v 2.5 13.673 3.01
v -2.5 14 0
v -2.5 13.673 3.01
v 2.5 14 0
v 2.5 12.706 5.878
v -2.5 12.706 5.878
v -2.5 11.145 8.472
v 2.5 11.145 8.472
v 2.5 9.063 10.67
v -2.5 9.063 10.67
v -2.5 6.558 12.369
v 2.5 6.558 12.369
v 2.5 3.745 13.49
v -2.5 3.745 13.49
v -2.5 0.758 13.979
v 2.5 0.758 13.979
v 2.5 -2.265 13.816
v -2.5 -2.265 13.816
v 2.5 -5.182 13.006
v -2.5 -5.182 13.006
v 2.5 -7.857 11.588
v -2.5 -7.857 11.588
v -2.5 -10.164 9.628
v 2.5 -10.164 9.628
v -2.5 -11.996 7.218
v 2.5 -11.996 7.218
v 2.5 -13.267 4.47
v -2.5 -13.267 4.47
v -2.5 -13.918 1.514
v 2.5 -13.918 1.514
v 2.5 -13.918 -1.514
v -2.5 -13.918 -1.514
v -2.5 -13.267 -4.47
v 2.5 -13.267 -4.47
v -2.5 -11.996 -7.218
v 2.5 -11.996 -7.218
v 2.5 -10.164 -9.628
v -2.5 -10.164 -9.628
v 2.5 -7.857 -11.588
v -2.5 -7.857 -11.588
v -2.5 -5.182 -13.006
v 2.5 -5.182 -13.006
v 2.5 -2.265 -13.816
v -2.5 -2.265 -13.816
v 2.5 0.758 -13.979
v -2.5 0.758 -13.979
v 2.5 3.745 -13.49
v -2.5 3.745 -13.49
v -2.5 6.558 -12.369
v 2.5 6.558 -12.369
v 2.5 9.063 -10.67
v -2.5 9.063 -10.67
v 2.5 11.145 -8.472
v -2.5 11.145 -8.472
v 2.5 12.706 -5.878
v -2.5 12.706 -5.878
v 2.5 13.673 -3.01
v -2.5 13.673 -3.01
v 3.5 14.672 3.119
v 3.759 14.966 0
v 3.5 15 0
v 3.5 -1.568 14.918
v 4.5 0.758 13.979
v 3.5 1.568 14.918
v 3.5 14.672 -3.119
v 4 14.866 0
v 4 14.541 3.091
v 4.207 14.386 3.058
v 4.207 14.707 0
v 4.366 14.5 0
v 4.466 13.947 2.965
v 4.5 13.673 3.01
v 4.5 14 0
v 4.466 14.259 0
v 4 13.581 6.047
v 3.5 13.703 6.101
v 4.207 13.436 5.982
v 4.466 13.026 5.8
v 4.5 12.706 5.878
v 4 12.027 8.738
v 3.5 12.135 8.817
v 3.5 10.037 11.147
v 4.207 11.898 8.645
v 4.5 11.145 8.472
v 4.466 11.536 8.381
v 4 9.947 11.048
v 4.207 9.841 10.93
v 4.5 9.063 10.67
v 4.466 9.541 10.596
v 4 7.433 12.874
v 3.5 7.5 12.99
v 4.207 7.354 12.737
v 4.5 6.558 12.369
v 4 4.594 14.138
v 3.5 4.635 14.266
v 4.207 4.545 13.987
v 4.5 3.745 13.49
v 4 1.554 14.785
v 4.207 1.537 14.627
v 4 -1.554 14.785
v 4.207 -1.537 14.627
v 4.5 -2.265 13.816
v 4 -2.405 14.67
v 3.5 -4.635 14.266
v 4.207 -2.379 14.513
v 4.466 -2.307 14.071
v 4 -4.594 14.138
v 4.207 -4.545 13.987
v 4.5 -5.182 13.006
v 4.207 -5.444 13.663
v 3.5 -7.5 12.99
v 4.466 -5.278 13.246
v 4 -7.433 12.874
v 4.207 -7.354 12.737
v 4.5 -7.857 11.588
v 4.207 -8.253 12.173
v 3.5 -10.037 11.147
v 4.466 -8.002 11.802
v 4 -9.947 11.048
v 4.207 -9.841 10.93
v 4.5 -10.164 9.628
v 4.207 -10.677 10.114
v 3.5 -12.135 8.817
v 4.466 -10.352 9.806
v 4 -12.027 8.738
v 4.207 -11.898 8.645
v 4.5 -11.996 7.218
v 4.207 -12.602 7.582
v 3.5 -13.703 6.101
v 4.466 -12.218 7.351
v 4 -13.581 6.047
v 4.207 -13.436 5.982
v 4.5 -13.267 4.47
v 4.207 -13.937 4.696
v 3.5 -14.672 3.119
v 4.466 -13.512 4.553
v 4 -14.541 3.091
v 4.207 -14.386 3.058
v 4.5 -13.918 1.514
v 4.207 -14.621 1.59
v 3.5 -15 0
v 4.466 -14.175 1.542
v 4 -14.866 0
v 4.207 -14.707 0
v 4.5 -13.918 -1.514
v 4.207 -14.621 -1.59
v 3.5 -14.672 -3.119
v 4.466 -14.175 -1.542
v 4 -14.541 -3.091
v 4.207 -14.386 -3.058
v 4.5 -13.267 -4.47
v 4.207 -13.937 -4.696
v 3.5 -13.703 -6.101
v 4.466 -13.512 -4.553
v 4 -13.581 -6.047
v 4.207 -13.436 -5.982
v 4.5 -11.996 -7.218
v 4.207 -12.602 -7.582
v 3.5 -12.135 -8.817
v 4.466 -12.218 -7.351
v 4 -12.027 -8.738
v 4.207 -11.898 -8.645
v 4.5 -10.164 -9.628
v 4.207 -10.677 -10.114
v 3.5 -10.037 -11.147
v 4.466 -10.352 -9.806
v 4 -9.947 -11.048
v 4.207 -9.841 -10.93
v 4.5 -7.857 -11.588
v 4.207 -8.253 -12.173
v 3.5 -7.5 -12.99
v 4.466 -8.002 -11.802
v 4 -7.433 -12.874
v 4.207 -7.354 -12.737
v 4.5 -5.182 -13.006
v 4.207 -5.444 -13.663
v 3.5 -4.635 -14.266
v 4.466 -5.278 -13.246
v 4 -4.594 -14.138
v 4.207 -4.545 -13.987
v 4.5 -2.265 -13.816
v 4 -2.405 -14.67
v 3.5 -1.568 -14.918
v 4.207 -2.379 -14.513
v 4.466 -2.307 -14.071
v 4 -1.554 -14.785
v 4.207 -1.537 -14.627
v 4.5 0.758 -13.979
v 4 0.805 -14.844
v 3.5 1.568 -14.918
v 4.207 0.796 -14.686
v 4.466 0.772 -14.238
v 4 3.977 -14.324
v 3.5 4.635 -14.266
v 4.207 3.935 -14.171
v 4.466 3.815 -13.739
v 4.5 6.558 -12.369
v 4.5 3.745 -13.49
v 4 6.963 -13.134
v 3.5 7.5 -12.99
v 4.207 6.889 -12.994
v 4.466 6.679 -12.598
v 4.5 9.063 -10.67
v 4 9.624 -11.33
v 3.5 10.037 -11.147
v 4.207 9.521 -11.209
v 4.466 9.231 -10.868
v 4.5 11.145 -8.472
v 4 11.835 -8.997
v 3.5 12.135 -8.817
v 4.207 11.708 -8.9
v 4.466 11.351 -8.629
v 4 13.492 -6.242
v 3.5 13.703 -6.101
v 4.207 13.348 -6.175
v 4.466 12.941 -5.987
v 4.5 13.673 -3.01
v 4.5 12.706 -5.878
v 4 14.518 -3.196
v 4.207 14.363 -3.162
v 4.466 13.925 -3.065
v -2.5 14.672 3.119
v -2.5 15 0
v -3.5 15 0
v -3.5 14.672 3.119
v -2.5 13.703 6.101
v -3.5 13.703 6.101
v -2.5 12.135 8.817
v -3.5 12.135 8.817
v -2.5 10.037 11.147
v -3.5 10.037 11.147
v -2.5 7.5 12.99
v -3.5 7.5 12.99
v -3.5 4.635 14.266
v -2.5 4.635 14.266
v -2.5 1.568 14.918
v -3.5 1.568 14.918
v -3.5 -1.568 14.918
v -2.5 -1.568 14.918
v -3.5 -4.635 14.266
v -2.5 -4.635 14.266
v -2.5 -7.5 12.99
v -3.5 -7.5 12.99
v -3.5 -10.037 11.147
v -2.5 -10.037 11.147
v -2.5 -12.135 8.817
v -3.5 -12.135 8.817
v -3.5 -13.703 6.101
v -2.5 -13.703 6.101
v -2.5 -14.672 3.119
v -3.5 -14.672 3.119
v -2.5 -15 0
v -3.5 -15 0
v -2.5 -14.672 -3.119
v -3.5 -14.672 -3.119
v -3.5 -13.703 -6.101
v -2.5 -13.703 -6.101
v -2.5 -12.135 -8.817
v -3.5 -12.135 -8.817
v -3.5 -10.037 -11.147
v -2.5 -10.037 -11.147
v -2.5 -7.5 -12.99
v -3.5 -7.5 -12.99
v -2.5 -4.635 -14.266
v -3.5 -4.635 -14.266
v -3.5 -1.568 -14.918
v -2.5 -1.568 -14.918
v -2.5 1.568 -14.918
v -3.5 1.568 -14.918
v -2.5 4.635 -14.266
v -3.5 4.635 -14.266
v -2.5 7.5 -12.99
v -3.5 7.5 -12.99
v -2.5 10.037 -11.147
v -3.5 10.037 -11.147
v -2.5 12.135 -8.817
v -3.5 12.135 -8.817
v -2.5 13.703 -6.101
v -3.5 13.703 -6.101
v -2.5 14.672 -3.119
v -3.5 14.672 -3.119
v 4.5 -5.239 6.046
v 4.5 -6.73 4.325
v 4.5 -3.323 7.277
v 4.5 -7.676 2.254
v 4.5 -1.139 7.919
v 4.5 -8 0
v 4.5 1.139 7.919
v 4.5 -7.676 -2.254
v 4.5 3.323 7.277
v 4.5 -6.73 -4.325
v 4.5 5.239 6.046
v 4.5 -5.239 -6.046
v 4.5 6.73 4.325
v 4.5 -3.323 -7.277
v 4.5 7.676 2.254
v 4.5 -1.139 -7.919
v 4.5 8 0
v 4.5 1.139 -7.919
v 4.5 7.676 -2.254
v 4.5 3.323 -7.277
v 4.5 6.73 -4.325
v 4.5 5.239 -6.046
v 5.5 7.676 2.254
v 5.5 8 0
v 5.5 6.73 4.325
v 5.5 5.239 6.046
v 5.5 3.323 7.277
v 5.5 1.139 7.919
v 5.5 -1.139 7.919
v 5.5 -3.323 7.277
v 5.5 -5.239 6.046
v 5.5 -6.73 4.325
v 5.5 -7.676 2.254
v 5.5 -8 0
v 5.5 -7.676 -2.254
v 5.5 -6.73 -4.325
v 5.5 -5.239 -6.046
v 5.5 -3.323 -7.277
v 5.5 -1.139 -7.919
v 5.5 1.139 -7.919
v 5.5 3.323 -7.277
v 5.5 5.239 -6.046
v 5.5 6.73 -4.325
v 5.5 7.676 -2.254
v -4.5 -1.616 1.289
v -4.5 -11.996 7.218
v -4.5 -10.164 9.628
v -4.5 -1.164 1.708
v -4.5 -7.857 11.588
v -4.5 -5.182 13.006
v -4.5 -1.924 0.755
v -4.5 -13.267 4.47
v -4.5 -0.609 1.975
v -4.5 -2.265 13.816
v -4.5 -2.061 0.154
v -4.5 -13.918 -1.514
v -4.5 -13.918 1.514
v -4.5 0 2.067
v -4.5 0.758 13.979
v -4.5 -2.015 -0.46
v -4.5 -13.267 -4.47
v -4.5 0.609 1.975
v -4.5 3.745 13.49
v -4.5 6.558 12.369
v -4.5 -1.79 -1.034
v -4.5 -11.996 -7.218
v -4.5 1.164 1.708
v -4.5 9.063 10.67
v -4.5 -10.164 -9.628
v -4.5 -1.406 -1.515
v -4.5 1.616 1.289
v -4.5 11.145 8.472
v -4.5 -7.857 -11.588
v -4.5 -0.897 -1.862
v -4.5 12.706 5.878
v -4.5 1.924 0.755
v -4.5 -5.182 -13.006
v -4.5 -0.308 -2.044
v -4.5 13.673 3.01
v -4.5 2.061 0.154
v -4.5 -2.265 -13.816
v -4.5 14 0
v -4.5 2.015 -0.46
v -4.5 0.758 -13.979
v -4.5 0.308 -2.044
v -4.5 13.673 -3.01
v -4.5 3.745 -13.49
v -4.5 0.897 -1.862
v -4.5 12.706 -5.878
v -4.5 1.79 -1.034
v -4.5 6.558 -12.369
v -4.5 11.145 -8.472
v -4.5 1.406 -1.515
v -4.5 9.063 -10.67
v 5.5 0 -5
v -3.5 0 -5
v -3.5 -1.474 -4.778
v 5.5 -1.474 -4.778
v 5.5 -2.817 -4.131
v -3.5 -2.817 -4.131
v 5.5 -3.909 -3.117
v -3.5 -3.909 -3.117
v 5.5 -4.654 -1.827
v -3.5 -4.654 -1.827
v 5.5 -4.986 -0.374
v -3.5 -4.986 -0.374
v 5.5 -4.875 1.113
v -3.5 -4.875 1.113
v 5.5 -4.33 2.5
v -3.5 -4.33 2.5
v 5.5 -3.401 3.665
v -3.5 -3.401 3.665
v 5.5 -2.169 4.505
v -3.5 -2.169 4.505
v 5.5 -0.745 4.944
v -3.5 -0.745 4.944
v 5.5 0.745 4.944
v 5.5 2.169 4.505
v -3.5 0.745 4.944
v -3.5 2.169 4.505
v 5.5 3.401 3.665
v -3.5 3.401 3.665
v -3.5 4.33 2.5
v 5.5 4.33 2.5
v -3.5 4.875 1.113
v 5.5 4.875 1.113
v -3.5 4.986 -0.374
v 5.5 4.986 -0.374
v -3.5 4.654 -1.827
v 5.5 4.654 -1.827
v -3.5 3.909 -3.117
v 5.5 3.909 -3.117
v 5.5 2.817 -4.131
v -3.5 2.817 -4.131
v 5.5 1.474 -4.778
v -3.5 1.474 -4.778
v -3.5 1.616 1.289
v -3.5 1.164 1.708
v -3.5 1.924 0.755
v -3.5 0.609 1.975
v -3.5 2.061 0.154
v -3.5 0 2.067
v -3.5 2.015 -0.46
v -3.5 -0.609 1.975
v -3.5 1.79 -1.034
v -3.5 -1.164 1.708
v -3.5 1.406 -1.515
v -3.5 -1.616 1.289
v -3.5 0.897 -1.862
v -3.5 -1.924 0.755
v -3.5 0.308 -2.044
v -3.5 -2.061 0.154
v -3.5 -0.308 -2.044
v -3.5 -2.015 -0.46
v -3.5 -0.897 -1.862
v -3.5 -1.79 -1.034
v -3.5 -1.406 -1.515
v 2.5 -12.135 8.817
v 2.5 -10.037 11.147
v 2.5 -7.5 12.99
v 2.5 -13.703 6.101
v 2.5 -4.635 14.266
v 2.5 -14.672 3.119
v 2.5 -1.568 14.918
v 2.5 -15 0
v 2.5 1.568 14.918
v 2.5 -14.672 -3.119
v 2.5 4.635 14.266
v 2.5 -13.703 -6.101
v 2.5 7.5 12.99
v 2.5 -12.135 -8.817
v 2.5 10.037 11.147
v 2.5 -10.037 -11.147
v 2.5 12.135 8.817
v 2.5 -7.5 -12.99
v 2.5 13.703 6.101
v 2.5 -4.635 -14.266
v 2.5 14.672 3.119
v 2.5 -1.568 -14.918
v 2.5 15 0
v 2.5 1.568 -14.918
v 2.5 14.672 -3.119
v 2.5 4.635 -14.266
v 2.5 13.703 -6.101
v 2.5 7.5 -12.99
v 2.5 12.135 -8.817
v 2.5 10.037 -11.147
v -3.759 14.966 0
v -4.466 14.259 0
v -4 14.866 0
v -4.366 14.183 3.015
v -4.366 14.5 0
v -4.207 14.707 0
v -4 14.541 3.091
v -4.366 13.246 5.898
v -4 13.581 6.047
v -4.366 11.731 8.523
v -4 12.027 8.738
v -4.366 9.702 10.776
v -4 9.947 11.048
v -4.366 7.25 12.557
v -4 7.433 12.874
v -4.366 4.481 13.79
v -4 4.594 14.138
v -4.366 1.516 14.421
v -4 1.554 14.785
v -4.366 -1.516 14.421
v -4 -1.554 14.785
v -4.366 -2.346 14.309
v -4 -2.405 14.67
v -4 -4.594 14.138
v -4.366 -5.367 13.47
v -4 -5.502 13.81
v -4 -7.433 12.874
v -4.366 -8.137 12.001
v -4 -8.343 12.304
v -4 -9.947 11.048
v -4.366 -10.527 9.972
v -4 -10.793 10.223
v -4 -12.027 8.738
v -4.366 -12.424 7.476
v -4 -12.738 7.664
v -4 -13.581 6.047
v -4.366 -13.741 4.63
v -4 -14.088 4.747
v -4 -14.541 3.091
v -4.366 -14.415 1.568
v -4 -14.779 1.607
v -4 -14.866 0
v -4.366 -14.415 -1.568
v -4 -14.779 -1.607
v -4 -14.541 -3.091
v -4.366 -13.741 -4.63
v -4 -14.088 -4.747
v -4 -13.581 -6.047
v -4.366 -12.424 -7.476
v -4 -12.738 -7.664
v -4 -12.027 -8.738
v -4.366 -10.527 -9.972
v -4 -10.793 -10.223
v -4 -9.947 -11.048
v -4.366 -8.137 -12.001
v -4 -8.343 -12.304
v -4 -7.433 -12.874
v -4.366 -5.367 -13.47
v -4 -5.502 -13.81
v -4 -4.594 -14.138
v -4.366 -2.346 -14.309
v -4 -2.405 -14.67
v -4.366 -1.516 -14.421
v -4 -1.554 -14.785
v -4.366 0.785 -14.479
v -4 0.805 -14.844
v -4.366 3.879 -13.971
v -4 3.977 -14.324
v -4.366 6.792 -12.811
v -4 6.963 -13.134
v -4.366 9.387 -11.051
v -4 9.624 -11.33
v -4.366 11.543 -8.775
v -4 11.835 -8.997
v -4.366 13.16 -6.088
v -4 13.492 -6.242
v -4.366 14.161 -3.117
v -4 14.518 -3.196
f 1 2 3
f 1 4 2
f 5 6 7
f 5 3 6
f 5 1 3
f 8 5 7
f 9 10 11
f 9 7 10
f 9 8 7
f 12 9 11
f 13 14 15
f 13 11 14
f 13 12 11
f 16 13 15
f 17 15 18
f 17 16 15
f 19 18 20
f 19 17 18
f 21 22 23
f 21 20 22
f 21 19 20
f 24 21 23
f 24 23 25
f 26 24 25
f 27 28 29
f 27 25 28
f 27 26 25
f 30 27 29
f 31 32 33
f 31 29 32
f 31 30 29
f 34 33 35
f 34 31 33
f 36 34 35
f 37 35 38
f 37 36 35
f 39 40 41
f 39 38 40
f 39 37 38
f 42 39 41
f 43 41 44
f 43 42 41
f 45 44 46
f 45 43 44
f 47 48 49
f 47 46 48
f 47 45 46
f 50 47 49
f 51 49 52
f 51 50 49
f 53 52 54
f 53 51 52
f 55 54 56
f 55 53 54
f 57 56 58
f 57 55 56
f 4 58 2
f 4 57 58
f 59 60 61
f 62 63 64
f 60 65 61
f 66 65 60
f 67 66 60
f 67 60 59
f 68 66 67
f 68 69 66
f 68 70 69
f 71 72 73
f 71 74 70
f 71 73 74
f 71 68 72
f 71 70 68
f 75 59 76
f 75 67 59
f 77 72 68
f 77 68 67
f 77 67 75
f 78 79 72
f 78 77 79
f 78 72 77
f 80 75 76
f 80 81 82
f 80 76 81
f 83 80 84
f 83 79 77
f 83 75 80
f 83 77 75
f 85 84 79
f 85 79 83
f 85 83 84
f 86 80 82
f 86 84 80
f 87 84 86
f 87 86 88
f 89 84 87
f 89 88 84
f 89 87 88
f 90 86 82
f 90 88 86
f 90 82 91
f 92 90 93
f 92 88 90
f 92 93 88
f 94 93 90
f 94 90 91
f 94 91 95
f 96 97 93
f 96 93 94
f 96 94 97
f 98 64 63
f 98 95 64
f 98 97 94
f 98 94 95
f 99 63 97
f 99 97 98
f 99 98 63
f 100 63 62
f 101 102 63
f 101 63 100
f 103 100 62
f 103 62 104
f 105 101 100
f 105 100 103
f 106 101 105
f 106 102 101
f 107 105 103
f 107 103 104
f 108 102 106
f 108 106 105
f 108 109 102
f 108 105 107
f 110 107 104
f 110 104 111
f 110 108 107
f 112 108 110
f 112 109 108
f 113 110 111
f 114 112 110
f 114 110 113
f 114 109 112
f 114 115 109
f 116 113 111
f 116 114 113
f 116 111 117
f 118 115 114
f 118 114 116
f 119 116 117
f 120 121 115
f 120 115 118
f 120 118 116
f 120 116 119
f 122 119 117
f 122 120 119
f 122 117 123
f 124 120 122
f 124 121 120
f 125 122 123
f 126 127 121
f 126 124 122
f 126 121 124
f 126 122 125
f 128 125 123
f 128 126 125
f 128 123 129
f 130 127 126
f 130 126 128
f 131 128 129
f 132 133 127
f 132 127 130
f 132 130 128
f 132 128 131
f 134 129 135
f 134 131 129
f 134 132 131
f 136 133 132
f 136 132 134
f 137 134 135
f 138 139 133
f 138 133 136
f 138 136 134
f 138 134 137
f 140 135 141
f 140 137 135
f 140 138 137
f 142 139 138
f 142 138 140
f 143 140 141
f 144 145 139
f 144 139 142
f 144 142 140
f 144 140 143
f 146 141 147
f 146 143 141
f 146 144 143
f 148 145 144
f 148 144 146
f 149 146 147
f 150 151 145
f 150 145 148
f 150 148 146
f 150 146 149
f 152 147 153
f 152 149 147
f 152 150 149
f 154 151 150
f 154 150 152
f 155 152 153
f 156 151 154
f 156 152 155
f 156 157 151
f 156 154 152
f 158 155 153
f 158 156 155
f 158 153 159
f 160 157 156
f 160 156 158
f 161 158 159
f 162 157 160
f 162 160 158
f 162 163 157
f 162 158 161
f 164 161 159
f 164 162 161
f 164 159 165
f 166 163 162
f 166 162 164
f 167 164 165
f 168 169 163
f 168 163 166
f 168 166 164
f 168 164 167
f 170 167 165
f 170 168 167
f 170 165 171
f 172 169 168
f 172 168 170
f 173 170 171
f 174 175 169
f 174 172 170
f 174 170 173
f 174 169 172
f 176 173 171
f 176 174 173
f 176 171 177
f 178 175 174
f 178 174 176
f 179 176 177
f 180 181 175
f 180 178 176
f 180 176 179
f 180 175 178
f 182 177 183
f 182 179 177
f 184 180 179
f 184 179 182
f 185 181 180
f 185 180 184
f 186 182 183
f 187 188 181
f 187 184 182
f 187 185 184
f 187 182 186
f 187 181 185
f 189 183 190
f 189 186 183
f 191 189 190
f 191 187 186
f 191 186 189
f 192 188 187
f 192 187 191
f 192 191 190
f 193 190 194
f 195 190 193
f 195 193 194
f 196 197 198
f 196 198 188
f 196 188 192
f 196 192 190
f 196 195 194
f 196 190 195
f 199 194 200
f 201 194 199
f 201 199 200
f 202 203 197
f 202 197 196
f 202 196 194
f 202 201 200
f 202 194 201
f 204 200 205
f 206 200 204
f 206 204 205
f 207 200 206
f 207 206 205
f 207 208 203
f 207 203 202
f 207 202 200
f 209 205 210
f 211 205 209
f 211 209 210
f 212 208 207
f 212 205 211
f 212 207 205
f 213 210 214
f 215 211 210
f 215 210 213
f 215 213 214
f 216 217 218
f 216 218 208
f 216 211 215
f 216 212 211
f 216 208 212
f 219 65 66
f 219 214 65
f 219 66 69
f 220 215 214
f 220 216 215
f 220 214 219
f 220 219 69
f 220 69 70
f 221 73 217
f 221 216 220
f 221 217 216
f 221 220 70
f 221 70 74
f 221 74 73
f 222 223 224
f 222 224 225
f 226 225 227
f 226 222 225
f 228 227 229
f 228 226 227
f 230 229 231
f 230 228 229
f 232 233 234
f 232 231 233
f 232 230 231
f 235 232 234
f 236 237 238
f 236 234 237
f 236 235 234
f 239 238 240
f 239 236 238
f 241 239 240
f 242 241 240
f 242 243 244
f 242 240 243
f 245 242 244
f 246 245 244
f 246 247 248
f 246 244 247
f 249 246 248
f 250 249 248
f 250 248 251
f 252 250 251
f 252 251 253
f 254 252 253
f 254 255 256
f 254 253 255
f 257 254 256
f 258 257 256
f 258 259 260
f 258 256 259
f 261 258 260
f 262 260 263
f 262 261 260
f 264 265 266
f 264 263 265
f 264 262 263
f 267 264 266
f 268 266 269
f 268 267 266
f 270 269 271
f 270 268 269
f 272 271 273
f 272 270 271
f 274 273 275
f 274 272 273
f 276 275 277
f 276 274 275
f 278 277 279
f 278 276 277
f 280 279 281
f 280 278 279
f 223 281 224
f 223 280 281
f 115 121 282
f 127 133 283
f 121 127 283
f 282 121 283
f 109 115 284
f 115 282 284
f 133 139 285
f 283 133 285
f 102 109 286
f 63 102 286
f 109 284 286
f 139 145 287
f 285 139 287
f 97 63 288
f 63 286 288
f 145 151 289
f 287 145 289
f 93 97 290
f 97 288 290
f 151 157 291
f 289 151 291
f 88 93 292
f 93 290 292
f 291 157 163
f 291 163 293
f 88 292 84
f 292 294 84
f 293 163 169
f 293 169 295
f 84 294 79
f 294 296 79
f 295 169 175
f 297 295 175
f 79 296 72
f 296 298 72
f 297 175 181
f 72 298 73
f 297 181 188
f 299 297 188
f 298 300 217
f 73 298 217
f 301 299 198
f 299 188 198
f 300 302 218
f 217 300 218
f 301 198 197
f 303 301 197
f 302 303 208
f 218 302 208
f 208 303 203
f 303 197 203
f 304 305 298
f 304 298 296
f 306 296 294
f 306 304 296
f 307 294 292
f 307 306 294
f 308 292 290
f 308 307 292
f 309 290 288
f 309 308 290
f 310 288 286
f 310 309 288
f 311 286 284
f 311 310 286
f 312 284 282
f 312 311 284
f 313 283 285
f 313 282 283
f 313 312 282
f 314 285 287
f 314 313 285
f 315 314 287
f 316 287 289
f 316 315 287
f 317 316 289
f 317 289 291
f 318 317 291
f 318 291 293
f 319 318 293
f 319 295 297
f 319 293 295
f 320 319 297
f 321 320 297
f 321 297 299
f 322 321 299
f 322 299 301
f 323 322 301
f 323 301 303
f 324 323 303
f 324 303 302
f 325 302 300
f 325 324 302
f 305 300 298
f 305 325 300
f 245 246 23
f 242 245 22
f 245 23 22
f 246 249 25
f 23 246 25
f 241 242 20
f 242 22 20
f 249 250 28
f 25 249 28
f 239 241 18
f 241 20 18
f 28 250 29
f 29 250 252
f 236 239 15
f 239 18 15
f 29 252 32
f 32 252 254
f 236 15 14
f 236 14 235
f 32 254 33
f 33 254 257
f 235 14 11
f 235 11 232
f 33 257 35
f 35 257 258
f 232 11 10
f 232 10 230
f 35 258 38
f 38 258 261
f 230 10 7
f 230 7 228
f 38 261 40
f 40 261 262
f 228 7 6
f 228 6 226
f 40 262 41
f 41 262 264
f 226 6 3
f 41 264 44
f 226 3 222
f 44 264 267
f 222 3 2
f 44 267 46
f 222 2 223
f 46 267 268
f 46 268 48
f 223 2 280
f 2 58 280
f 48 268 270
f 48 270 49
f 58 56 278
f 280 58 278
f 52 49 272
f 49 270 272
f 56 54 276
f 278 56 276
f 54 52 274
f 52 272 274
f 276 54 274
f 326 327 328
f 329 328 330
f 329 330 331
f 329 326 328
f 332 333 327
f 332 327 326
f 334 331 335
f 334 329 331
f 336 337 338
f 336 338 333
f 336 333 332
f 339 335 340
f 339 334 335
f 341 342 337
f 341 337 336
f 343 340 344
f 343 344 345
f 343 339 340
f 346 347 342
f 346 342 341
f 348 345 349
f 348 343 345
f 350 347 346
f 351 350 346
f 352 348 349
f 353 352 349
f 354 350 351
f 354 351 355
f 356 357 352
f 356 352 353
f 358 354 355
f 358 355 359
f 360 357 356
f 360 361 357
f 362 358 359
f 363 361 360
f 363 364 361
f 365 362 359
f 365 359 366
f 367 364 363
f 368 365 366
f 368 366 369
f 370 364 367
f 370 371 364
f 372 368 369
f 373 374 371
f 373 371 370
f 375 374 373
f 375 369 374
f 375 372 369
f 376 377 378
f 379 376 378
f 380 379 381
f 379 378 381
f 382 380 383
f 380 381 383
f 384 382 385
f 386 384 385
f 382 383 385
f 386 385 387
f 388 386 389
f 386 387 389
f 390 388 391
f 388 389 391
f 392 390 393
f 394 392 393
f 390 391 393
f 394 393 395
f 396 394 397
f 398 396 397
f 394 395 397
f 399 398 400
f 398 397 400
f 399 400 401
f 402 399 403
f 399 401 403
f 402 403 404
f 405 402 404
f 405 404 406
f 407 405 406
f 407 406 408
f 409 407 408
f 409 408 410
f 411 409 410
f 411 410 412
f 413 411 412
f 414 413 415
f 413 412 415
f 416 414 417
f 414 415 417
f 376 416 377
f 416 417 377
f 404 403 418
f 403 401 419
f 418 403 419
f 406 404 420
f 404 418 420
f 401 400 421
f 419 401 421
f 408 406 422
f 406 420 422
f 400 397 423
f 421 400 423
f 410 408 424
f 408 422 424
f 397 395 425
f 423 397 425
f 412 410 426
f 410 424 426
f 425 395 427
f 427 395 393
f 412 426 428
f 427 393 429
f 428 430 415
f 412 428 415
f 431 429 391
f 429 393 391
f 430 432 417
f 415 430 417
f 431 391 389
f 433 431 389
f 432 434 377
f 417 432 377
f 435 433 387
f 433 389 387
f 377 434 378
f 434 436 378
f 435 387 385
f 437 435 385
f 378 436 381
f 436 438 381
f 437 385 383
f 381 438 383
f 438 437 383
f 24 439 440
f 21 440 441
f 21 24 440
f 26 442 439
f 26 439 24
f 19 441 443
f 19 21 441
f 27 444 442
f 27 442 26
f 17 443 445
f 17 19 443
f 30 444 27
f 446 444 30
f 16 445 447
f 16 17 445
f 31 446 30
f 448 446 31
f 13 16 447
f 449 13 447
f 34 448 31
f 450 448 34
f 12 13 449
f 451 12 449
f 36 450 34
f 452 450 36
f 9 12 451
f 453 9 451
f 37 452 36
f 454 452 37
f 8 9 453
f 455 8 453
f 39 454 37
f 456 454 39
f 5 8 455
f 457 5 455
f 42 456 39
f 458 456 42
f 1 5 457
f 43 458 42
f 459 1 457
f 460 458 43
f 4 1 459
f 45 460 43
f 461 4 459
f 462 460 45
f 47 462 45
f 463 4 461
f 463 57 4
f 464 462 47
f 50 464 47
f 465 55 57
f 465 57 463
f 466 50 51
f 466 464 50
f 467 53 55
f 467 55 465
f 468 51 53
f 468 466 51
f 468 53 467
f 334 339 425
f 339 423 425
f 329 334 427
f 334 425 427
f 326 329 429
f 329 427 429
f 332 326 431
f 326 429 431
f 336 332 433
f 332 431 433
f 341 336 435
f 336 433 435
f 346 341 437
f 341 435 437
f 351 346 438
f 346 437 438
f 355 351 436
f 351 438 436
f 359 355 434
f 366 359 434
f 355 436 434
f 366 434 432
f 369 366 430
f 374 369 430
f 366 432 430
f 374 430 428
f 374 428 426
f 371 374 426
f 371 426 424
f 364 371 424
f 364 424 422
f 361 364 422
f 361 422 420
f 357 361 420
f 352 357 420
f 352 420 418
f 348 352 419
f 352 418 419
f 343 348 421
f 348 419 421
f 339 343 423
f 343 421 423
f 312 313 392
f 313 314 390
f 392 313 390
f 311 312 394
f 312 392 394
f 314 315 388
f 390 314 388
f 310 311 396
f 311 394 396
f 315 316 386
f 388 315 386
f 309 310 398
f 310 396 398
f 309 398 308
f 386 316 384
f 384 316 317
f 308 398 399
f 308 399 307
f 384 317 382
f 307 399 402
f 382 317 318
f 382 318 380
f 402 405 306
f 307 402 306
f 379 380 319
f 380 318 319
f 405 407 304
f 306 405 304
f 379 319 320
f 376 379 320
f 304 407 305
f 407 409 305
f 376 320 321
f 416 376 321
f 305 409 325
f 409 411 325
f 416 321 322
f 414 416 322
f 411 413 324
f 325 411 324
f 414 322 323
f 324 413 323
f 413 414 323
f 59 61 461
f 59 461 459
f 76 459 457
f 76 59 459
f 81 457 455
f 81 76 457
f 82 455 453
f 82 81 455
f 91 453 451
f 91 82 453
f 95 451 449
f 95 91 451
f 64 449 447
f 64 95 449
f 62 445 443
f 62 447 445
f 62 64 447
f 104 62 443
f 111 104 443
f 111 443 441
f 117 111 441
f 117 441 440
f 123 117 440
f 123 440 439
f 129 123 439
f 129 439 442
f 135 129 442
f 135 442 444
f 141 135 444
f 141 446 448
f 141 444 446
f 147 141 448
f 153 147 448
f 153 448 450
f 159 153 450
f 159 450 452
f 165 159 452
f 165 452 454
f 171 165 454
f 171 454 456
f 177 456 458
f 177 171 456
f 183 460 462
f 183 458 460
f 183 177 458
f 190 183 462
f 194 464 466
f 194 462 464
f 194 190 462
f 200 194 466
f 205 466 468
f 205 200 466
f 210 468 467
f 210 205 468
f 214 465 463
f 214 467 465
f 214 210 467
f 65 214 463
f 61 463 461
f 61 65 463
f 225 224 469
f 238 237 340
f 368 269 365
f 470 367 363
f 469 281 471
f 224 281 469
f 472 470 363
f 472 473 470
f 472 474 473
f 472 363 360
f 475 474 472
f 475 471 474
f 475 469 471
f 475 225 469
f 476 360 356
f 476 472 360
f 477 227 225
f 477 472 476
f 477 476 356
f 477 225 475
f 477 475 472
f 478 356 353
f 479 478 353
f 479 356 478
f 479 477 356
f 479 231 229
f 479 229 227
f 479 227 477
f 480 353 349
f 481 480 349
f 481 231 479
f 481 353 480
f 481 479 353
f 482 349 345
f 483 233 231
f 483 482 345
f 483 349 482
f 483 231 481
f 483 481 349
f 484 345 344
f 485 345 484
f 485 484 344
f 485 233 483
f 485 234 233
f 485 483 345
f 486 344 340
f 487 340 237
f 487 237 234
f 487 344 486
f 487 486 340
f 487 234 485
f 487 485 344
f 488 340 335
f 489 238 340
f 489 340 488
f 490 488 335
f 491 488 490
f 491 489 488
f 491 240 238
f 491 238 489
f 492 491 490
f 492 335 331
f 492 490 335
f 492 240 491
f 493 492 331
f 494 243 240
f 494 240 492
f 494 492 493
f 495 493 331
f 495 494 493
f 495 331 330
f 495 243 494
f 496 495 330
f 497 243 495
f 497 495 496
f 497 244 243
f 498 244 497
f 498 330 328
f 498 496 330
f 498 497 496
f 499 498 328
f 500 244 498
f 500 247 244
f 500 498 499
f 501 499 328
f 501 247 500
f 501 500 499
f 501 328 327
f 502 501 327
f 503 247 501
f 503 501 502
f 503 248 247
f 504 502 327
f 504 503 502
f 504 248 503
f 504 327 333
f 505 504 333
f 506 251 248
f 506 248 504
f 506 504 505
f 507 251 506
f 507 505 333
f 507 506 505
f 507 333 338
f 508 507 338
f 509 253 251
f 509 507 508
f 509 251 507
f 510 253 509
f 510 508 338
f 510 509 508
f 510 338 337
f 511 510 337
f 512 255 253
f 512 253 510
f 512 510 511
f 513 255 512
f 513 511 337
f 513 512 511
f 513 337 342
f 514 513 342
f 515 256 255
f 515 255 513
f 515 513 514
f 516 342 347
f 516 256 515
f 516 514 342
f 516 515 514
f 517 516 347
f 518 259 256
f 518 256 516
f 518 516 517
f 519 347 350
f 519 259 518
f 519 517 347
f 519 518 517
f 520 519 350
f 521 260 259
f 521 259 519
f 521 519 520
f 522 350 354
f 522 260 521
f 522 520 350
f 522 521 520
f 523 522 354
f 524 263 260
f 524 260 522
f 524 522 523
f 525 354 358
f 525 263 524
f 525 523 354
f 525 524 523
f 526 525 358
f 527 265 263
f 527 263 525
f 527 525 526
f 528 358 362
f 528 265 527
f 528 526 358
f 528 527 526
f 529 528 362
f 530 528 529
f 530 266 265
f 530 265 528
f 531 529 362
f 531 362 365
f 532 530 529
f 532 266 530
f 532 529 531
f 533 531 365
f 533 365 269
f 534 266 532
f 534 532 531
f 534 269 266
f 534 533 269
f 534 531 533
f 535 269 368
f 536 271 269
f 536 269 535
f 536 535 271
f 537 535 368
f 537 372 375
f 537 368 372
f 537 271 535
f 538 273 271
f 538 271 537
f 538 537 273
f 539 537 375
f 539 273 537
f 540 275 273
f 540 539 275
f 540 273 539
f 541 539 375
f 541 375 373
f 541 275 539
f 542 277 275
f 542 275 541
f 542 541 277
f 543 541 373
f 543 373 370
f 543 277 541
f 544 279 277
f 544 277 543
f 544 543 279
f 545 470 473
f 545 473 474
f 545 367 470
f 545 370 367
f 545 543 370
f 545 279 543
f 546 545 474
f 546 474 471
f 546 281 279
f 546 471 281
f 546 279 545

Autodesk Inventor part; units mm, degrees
ref_plane "YZ Plane" through (0, 0, 0) normal (1, 0, 0) x (0, 1, 0)
ref_plane "XZ Plane" through (0, 0, 0) normal (0, 1, 0) x (-1, 0, 0)
ref_plane "XY Plane" through (0, 0, 0) normal (0, 0, 1) x (1, 0, 0)
sketch "Sketch1" plane through (0, 0, 0) normal (0, 0, 1) x (1, 0, 0)
  line L0 (-4.5, 0) -> (-4.5, 15)
  line L1 (-4.5, 15) -> (-2.5, 15)
  line L2 (-2.5, 15) -> (-2.5, 14)
  line L3 (-2.5, 14) -> (2.5, 14)
  line L4 (2.5, 14) -> (2.5, 15)
  line L5 (2.5, 15) -> (4.5, 15)
  line L6 (4.5, 15) -> (4.5, 0)
  line L7 (4.5, 0) -> (-4.5, 0)
  line L8 (4.5, 8) -> (5.5, 8)
  line L9 (5.5, 8) -> (5.5, 0)
  line L10 (4.5, 0) -> (5.5, 0)
  line L11 (0, 14) -> (0, 0) construction
  dimension "d0" = 30
  dimension "d1" = 2
  dimension "d2" = 2
  dimension "d3" = 9
  dimension "d4" = 16
  dimension "d5" = 1
  dimension "d6" = 28
revolve "Revolution1" add sketch "Sketch1" angle 360 about axis through (4.5, 0, 0) along (-1, 0, 0)
sketch "Sketch3" plane through (-4.5, 0, 0) normal (-1, 0, 0) x (0, 0, 1)
  circle A0 centre (0, 0) radius 15 projected
  point P0 (0, 0)
hole "Hole2" at (-4.5, 0, 0) direction (1, 0, 0) diameter 4.134 depth 10 thread size "M5x0.8" class "6H" standard "ISO Metric profile"
sketch "Sketch4" plane through (5.5, 0, 0) normal (1, 0, 0) x (0, 0, -1)
  circle A0 centre (0, 0) radius 8 projected
  point P0 (0, 0)
hole "Hole3" at (5.5, 0, 0) direction (-1, 0, 0) diameter 10 depth 9
fillet "Fillet2" radius 1 2 edges at (-4.5, -15, 0) (4.5, -15, 0)
properties part number "11 base"
